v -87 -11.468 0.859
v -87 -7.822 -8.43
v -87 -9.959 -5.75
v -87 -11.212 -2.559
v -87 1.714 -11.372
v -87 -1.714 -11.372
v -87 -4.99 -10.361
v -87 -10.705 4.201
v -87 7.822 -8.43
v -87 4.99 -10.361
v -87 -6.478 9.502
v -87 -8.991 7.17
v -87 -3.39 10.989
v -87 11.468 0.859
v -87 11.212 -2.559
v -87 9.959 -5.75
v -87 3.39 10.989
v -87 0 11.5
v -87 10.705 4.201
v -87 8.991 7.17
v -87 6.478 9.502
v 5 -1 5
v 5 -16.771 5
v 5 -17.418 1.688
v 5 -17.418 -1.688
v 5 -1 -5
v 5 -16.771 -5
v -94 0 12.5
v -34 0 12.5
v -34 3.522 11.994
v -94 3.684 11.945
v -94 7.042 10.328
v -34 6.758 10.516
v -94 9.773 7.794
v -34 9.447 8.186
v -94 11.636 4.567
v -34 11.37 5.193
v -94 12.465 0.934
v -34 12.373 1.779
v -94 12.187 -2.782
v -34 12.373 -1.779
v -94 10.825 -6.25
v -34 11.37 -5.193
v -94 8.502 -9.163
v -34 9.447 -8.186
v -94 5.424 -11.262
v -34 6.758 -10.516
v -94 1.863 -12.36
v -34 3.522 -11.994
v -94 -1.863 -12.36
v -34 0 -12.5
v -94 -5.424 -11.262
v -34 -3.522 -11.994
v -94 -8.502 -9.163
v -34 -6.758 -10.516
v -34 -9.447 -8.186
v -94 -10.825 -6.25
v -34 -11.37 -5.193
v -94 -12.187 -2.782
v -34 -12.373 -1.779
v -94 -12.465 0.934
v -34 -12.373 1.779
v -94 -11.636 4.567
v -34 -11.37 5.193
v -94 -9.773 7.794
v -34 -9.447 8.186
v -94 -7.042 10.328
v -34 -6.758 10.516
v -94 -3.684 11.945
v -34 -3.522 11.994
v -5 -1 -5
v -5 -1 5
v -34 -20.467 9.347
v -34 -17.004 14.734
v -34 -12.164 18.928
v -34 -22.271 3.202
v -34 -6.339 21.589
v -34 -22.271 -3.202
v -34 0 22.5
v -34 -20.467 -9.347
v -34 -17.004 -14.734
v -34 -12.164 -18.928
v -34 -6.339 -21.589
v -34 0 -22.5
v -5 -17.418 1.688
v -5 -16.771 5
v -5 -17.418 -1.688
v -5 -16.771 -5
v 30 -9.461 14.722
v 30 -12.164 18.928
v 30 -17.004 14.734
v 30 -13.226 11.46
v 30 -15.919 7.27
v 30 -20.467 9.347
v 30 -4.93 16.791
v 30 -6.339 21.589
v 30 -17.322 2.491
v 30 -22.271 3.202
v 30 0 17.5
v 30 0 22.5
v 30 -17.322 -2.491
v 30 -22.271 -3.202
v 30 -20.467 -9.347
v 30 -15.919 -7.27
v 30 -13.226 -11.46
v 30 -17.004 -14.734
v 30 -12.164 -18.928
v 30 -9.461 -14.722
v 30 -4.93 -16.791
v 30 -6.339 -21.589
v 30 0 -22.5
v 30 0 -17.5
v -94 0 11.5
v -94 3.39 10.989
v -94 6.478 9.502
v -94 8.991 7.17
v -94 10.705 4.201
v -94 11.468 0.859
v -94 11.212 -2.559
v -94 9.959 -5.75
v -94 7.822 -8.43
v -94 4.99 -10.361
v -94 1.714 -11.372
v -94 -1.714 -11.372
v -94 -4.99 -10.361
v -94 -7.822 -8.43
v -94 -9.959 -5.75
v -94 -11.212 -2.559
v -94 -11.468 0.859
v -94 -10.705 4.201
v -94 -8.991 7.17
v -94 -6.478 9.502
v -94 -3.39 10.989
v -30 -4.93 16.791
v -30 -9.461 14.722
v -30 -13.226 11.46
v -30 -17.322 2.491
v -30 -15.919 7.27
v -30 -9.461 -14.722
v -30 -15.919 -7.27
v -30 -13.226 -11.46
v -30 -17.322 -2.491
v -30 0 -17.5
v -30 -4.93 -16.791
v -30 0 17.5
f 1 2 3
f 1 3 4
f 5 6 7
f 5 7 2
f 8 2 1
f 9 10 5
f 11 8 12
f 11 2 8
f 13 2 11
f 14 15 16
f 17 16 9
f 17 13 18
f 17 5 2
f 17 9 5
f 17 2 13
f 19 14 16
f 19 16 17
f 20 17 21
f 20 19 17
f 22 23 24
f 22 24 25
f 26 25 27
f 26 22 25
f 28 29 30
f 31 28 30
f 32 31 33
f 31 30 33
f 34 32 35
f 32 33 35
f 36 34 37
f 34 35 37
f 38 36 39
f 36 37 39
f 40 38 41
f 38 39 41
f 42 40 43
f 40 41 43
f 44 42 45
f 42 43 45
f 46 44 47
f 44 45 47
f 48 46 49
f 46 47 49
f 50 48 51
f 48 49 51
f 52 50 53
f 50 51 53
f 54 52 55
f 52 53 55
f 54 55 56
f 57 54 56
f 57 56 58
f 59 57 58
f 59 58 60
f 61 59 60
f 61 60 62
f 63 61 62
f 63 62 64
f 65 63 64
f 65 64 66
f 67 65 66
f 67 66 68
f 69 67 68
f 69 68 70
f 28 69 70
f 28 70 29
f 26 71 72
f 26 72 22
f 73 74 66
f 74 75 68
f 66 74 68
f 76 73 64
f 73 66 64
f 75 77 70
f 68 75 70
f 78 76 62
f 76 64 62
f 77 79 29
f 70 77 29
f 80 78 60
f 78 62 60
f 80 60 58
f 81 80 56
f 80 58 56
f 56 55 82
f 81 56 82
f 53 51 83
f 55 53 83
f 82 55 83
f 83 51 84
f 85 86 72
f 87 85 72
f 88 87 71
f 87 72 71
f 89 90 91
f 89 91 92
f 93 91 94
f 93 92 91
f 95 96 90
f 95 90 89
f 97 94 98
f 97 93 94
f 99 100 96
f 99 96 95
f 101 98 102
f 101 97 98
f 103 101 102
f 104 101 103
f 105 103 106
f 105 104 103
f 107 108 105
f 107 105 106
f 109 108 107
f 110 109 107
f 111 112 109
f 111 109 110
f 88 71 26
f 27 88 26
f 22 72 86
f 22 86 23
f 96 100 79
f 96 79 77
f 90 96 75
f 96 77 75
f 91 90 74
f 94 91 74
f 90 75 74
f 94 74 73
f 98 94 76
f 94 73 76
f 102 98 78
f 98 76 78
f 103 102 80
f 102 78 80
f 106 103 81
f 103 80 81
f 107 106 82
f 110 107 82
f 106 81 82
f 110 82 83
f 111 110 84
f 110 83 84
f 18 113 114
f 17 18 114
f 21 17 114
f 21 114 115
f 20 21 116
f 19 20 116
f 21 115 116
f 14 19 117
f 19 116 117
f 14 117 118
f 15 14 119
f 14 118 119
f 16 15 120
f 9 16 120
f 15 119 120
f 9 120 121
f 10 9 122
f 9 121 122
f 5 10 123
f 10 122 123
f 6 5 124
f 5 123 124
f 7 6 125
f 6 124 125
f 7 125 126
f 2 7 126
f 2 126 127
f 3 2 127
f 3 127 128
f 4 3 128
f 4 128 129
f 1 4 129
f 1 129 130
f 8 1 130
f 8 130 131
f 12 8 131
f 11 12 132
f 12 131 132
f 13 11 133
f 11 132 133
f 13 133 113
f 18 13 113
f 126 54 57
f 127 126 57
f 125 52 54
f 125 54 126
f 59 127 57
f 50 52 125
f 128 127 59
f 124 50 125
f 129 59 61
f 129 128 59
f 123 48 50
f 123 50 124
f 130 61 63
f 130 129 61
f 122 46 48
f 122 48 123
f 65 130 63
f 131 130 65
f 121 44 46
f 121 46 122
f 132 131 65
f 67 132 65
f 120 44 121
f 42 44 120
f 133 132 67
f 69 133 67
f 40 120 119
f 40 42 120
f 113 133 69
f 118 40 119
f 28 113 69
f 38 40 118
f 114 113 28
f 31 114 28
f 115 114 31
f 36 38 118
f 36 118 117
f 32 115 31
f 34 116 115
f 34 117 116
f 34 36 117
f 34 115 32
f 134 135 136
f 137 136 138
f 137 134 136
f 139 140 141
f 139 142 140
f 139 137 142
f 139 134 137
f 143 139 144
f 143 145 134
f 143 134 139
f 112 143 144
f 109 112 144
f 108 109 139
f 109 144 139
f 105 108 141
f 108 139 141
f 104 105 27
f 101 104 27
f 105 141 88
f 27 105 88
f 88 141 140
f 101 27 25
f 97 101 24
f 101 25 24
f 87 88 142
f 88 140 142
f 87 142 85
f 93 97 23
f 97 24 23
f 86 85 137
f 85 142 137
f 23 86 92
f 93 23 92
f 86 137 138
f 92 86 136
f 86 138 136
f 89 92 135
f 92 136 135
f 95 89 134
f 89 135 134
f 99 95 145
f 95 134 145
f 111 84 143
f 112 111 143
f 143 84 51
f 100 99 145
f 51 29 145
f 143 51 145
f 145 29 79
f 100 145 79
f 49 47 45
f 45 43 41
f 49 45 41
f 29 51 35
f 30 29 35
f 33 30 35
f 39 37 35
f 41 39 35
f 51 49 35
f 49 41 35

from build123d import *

# Parameters (mm, degrees)
BOSS_EXTRUDE1_DEPTH      = 30
BOSS_EXTRUDE1_DEPTH_BACK = 30
BOSS_EXTRUDE2_REACH      = 46.732
BOSS_EXTRUDE2_END_RADIUS = 17.5
BOSS_EXTRUDE2_START      = -1
SKETCH3_W                = 10
SKETCH3_H                = 10
BOSS_EXTRUDE3_START      = 4
BOSS_EXTRUDE3_DEPTH      = 4
SKETCH5_R                = 12.5
BOSS_EXTRUDE4_DEPTH      = 60
SKETCH6_R                = 11.5
CUT_EXTRUDE1_DEPTH       = 7


with BuildPart() as part:
    # Sketch1 → Boss-Extrude1 (new, two sides: drawn at the far end of the back side and taken through both)
    with BuildSketch(Plane(origin=(0, 0, 0), x_dir=(0, 0, -1), z_dir=(1, 0, 0)).offset(-BOSS_EXTRUDE1_DEPTH_BACK)):
        with BuildLine():
            Line((-17.5, 0), (-22.5, 0))
            ThreePointArc((-22.5, 0), (0, -22.5), (22.5, 0))
            Line((22.5, 0), (17.5, 0))
            ThreePointArc((17.5, 0), (0, -17.5), (-17.5, 0))
        make_face()
    extrude(amount=BOSS_EXTRUDE1_DEPTH + BOSS_EXTRUDE1_DEPTH_BACK)

    # Boss-Extrude2: up to this cylinder (the profile starts inside it)
    boss_extrude2_end = Plane(origin=(0, 0, 0), z_dir=(1, 0, 0)) * Cylinder(BOSS_EXTRUDE2_END_RADIUS, 129.464, mode=Mode.PRIVATE)
    # Sketch3 → Boss-Extrude2 (add, up to the surface)
    with BuildSketch(Plane(origin=(0, 0, 0), x_dir=(1, 0, 0), z_dir=(0, 1, 0)).offset(BOSS_EXTRUDE2_START), mode=Mode.PRIVATE) as boss_extrude2_sk1:
        Rectangle(SKETCH3_W, SKETCH3_H)
    boss_extrude2_tool1 = extrude(boss_extrude2_sk1.sketch, amount=-BOSS_EXTRUDE2_REACH, mode=Mode.PRIVATE) & boss_extrude2_end
    add(boss_extrude2_tool1.solids().sort_by_distance((0, -1, 0))[0])

    # Sketch4 → Boss-Extrude3 (add)
    with BuildSketch(Plane.ZY.offset(30).offset(BOSS_EXTRUDE3_START)):
        with BuildLine():
            Line((-22.5, 0), (22.5, 0))
            ThreePointArc((22.5, 0), (0, -22.5), (-22.5, 0))
        make_face()
    extrude(amount=-BOSS_EXTRUDE3_DEPTH)

    # Sketch5 → Boss-Extrude4 (add)
    with BuildSketch(Plane.ZY.offset(34)):
        Circle(SKETCH5_R)
    extrude(amount=BOSS_EXTRUDE4_DEPTH)

    # Sketch6 → Cut-Extrude1 (cut)
    with BuildSketch(Plane.ZY.offset(94)):
        Circle(SKETCH6_R)
    extrude(amount=-CUT_EXTRUDE1_DEPTH, mode=Mode.SUBTRACT)


solid = part.part
